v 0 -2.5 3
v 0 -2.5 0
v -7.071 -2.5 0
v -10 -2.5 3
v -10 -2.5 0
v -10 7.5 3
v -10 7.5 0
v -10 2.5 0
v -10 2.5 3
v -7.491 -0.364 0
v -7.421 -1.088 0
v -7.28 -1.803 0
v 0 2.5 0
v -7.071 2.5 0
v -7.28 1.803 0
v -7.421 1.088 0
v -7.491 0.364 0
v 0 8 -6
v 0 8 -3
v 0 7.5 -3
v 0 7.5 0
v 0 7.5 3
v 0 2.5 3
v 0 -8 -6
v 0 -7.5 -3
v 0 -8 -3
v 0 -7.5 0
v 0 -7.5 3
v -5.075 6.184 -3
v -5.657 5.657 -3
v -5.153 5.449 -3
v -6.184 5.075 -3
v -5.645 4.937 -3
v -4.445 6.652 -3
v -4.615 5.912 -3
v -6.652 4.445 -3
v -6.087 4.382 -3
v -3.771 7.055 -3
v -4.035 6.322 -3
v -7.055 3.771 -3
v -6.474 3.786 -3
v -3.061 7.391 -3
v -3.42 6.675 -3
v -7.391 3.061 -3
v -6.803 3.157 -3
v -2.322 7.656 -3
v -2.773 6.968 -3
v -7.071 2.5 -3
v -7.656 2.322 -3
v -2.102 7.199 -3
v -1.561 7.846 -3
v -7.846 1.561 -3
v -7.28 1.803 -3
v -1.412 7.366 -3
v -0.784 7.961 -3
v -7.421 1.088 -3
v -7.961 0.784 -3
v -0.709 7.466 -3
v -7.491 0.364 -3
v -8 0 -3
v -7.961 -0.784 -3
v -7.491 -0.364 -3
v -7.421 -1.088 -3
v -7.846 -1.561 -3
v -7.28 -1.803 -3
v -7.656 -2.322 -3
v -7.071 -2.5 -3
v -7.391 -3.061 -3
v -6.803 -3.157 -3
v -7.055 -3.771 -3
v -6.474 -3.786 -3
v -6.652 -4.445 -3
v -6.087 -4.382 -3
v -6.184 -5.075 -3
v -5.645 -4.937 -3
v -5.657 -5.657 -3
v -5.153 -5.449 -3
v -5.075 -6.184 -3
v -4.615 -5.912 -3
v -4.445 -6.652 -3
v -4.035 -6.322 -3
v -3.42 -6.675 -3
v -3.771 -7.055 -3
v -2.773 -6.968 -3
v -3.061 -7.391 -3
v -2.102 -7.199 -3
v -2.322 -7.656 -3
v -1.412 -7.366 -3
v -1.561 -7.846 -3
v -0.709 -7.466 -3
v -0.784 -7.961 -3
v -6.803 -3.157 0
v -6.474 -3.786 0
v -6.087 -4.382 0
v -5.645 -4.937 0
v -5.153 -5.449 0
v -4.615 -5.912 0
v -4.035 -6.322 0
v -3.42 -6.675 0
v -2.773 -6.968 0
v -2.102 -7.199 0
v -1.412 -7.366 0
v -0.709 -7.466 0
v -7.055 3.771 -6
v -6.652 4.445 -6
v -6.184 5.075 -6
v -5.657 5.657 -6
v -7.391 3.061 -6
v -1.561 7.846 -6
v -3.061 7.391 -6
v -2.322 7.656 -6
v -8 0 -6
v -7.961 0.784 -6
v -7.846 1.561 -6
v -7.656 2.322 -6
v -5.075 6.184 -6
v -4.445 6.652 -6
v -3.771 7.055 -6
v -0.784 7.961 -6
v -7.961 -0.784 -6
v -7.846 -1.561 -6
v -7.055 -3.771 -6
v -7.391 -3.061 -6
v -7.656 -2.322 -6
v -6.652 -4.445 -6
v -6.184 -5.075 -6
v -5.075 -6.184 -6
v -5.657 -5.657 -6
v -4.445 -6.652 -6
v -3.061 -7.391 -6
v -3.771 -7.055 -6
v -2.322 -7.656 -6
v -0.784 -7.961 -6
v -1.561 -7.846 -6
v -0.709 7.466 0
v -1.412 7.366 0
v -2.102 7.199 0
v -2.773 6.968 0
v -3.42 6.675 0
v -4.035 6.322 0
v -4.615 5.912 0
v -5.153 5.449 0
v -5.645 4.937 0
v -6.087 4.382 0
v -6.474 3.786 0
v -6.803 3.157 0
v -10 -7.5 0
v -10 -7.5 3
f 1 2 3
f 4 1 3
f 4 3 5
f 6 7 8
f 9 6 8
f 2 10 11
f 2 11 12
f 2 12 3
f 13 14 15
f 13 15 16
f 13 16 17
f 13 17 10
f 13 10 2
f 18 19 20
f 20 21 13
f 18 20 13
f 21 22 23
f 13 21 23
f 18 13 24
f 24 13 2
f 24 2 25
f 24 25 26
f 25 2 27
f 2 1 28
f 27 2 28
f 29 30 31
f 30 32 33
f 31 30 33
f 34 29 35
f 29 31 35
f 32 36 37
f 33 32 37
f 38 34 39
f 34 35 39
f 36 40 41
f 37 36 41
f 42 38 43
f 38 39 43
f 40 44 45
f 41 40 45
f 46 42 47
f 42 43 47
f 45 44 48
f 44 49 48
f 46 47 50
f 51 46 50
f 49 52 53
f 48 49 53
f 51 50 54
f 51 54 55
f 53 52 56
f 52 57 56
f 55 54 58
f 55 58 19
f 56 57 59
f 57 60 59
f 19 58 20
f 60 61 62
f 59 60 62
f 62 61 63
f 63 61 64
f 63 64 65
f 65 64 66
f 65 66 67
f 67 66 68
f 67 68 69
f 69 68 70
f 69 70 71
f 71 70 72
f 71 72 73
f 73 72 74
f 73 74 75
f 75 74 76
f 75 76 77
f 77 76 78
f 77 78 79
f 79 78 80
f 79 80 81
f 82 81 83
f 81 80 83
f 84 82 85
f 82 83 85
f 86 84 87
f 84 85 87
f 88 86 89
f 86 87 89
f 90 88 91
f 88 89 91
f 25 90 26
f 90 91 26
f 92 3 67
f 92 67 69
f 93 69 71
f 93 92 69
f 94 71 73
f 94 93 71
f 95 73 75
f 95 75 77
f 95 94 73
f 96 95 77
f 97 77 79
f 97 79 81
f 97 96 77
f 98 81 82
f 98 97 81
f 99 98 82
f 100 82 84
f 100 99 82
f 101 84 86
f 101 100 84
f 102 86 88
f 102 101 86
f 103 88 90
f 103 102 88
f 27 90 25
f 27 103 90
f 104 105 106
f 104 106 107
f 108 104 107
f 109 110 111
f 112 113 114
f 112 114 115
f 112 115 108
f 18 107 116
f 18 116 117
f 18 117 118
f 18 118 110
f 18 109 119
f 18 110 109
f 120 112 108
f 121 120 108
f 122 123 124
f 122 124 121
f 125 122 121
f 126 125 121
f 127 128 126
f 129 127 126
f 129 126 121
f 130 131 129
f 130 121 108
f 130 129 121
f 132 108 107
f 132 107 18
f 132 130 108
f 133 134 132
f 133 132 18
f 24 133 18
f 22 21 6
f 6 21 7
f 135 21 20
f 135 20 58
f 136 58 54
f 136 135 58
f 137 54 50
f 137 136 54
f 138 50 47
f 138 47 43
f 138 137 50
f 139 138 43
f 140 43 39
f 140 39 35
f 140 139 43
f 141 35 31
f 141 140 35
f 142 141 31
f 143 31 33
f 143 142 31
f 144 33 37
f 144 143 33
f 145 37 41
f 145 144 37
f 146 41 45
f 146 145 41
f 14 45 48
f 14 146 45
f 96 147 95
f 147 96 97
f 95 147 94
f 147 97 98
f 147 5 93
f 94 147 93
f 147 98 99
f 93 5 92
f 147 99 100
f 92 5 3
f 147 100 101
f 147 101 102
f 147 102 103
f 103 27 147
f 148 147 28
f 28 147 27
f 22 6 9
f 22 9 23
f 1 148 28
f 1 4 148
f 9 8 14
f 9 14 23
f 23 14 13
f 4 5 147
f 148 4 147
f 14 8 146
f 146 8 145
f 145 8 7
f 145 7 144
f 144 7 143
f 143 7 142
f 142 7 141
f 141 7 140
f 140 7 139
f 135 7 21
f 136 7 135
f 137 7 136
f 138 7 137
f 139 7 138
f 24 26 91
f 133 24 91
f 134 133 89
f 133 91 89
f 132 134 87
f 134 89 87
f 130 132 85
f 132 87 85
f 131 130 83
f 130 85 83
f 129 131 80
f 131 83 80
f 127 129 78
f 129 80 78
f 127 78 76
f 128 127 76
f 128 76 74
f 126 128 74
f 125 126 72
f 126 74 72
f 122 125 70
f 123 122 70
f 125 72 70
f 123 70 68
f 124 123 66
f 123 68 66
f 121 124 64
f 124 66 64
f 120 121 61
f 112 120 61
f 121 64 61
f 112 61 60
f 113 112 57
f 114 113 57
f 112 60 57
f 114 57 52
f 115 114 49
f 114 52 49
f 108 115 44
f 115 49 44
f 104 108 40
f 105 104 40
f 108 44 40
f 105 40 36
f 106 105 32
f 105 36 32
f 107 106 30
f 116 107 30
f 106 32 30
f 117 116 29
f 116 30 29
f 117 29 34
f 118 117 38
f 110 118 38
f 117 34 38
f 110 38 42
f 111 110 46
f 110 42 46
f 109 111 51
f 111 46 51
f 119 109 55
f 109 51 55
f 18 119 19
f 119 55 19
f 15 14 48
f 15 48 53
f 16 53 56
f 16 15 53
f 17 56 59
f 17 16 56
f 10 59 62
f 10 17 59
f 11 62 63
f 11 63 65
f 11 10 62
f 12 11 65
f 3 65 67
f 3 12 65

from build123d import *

# Parameters (mm, degrees)
F1_DEPTH = 3
F2_DEPTH = 3
F4_DEPTH = 3


with BuildPart() as f1:
    # F0 (on Top) → F1 (new body)
    with BuildSketch(Plane.XY):
        with BuildLine():
            Line((0, 2.5), (-7.0710678119, 2.5))
            ThreePointArc((-7.0710678119, 2.5), (-7.5, 0), (-7.0710678119, -2.5))
            Line((-7.0710678119, -2.5), (0, -2.5))
            Line((0, -2.5), (0, 0))
            Line((0, 0), (0, 2.5))
        make_face()
        with BuildLine():
            ThreePointArc((-7.0710678119, -2.5), (-4.3301270189, -6.123724357), (0, -7.5))
            Line((0, -7.5), (0, -2.5))
            Line((0, -2.5), (-7.0710678119, -2.5))
        make_face()
        with BuildLine():
            Line((0, 2.5), (0, 7.5))
            ThreePointArc((0, 7.5), (-4.3301270189, 6.123724357), (-7.0710678119, 2.5))
            Line((-7.0710678119, 2.5), (0, 2.5))
        make_face()
    extrude(amount=-F1_DEPTH)

    # F0 (on Top) → F2 (join)
    with BuildSketch(Plane.XY):
        with BuildLine():
            ThreePointArc((-7.0710678119, 2.5), (-4.3301270189, 6.123724357), (0, 7.5))
            Line((0, 7.5), (-10, 7.5))
            Line((-10, 7.5), (-10, 2.5))
            Line((-10, 2.5), (-7.0710678119, 2.5))
        make_face()
        with BuildLine():
            Line((0, 2.5), (0, 7.5))
            ThreePointArc((0, 7.5), (-4.3301270189, 6.123724357), (-7.0710678119, 2.5))
            Line((-7.0710678119, 2.5), (0, 2.5))
        make_face()
        with BuildLine():
            Line((-10, -7.5), (0, -7.5))
            ThreePointArc((0, -7.5), (-4.3301270189, -6.123724357), (-7.0710678119, -2.5))
            Line((-7.0710678119, -2.5), (-10, -2.5))
            Line((-10, -2.5), (-10, -7.5))
        make_face()
        with BuildLine():
            ThreePointArc((-7.0710678119, -2.5), (-4.3301270189, -6.123724357), (0, -7.5))
            Line((0, -7.5), (0, -2.5))
            Line((0, -2.5), (-7.0710678119, -2.5))
        make_face()
    extrude(amount=F2_DEPTH)

    # F3 (on face) → F4 (join)
    with BuildSketch(Plane(origin=(0, 0, -3), x_dir=(1, 0, 0), z_dir=(0, 0, -1))):
        with BuildLine():
            Line((0, -7.5), (0, 7.5))
            ThreePointArc((0, 7.5), (-7.5, 0), (0, -7.5))
        make_face()
        with BuildLine():
            Line((0, 7.5), (0, 8))
            ThreePointArc((0, 8), (-8, 0), (0, -8))
            Line((0, -8), (0, -7.5))
            ThreePointArc((0, -7.5), (-7.5, 0), (0, 7.5))
        make_face()
    extrude(amount=F4_DEPTH)


solid = f1.part
